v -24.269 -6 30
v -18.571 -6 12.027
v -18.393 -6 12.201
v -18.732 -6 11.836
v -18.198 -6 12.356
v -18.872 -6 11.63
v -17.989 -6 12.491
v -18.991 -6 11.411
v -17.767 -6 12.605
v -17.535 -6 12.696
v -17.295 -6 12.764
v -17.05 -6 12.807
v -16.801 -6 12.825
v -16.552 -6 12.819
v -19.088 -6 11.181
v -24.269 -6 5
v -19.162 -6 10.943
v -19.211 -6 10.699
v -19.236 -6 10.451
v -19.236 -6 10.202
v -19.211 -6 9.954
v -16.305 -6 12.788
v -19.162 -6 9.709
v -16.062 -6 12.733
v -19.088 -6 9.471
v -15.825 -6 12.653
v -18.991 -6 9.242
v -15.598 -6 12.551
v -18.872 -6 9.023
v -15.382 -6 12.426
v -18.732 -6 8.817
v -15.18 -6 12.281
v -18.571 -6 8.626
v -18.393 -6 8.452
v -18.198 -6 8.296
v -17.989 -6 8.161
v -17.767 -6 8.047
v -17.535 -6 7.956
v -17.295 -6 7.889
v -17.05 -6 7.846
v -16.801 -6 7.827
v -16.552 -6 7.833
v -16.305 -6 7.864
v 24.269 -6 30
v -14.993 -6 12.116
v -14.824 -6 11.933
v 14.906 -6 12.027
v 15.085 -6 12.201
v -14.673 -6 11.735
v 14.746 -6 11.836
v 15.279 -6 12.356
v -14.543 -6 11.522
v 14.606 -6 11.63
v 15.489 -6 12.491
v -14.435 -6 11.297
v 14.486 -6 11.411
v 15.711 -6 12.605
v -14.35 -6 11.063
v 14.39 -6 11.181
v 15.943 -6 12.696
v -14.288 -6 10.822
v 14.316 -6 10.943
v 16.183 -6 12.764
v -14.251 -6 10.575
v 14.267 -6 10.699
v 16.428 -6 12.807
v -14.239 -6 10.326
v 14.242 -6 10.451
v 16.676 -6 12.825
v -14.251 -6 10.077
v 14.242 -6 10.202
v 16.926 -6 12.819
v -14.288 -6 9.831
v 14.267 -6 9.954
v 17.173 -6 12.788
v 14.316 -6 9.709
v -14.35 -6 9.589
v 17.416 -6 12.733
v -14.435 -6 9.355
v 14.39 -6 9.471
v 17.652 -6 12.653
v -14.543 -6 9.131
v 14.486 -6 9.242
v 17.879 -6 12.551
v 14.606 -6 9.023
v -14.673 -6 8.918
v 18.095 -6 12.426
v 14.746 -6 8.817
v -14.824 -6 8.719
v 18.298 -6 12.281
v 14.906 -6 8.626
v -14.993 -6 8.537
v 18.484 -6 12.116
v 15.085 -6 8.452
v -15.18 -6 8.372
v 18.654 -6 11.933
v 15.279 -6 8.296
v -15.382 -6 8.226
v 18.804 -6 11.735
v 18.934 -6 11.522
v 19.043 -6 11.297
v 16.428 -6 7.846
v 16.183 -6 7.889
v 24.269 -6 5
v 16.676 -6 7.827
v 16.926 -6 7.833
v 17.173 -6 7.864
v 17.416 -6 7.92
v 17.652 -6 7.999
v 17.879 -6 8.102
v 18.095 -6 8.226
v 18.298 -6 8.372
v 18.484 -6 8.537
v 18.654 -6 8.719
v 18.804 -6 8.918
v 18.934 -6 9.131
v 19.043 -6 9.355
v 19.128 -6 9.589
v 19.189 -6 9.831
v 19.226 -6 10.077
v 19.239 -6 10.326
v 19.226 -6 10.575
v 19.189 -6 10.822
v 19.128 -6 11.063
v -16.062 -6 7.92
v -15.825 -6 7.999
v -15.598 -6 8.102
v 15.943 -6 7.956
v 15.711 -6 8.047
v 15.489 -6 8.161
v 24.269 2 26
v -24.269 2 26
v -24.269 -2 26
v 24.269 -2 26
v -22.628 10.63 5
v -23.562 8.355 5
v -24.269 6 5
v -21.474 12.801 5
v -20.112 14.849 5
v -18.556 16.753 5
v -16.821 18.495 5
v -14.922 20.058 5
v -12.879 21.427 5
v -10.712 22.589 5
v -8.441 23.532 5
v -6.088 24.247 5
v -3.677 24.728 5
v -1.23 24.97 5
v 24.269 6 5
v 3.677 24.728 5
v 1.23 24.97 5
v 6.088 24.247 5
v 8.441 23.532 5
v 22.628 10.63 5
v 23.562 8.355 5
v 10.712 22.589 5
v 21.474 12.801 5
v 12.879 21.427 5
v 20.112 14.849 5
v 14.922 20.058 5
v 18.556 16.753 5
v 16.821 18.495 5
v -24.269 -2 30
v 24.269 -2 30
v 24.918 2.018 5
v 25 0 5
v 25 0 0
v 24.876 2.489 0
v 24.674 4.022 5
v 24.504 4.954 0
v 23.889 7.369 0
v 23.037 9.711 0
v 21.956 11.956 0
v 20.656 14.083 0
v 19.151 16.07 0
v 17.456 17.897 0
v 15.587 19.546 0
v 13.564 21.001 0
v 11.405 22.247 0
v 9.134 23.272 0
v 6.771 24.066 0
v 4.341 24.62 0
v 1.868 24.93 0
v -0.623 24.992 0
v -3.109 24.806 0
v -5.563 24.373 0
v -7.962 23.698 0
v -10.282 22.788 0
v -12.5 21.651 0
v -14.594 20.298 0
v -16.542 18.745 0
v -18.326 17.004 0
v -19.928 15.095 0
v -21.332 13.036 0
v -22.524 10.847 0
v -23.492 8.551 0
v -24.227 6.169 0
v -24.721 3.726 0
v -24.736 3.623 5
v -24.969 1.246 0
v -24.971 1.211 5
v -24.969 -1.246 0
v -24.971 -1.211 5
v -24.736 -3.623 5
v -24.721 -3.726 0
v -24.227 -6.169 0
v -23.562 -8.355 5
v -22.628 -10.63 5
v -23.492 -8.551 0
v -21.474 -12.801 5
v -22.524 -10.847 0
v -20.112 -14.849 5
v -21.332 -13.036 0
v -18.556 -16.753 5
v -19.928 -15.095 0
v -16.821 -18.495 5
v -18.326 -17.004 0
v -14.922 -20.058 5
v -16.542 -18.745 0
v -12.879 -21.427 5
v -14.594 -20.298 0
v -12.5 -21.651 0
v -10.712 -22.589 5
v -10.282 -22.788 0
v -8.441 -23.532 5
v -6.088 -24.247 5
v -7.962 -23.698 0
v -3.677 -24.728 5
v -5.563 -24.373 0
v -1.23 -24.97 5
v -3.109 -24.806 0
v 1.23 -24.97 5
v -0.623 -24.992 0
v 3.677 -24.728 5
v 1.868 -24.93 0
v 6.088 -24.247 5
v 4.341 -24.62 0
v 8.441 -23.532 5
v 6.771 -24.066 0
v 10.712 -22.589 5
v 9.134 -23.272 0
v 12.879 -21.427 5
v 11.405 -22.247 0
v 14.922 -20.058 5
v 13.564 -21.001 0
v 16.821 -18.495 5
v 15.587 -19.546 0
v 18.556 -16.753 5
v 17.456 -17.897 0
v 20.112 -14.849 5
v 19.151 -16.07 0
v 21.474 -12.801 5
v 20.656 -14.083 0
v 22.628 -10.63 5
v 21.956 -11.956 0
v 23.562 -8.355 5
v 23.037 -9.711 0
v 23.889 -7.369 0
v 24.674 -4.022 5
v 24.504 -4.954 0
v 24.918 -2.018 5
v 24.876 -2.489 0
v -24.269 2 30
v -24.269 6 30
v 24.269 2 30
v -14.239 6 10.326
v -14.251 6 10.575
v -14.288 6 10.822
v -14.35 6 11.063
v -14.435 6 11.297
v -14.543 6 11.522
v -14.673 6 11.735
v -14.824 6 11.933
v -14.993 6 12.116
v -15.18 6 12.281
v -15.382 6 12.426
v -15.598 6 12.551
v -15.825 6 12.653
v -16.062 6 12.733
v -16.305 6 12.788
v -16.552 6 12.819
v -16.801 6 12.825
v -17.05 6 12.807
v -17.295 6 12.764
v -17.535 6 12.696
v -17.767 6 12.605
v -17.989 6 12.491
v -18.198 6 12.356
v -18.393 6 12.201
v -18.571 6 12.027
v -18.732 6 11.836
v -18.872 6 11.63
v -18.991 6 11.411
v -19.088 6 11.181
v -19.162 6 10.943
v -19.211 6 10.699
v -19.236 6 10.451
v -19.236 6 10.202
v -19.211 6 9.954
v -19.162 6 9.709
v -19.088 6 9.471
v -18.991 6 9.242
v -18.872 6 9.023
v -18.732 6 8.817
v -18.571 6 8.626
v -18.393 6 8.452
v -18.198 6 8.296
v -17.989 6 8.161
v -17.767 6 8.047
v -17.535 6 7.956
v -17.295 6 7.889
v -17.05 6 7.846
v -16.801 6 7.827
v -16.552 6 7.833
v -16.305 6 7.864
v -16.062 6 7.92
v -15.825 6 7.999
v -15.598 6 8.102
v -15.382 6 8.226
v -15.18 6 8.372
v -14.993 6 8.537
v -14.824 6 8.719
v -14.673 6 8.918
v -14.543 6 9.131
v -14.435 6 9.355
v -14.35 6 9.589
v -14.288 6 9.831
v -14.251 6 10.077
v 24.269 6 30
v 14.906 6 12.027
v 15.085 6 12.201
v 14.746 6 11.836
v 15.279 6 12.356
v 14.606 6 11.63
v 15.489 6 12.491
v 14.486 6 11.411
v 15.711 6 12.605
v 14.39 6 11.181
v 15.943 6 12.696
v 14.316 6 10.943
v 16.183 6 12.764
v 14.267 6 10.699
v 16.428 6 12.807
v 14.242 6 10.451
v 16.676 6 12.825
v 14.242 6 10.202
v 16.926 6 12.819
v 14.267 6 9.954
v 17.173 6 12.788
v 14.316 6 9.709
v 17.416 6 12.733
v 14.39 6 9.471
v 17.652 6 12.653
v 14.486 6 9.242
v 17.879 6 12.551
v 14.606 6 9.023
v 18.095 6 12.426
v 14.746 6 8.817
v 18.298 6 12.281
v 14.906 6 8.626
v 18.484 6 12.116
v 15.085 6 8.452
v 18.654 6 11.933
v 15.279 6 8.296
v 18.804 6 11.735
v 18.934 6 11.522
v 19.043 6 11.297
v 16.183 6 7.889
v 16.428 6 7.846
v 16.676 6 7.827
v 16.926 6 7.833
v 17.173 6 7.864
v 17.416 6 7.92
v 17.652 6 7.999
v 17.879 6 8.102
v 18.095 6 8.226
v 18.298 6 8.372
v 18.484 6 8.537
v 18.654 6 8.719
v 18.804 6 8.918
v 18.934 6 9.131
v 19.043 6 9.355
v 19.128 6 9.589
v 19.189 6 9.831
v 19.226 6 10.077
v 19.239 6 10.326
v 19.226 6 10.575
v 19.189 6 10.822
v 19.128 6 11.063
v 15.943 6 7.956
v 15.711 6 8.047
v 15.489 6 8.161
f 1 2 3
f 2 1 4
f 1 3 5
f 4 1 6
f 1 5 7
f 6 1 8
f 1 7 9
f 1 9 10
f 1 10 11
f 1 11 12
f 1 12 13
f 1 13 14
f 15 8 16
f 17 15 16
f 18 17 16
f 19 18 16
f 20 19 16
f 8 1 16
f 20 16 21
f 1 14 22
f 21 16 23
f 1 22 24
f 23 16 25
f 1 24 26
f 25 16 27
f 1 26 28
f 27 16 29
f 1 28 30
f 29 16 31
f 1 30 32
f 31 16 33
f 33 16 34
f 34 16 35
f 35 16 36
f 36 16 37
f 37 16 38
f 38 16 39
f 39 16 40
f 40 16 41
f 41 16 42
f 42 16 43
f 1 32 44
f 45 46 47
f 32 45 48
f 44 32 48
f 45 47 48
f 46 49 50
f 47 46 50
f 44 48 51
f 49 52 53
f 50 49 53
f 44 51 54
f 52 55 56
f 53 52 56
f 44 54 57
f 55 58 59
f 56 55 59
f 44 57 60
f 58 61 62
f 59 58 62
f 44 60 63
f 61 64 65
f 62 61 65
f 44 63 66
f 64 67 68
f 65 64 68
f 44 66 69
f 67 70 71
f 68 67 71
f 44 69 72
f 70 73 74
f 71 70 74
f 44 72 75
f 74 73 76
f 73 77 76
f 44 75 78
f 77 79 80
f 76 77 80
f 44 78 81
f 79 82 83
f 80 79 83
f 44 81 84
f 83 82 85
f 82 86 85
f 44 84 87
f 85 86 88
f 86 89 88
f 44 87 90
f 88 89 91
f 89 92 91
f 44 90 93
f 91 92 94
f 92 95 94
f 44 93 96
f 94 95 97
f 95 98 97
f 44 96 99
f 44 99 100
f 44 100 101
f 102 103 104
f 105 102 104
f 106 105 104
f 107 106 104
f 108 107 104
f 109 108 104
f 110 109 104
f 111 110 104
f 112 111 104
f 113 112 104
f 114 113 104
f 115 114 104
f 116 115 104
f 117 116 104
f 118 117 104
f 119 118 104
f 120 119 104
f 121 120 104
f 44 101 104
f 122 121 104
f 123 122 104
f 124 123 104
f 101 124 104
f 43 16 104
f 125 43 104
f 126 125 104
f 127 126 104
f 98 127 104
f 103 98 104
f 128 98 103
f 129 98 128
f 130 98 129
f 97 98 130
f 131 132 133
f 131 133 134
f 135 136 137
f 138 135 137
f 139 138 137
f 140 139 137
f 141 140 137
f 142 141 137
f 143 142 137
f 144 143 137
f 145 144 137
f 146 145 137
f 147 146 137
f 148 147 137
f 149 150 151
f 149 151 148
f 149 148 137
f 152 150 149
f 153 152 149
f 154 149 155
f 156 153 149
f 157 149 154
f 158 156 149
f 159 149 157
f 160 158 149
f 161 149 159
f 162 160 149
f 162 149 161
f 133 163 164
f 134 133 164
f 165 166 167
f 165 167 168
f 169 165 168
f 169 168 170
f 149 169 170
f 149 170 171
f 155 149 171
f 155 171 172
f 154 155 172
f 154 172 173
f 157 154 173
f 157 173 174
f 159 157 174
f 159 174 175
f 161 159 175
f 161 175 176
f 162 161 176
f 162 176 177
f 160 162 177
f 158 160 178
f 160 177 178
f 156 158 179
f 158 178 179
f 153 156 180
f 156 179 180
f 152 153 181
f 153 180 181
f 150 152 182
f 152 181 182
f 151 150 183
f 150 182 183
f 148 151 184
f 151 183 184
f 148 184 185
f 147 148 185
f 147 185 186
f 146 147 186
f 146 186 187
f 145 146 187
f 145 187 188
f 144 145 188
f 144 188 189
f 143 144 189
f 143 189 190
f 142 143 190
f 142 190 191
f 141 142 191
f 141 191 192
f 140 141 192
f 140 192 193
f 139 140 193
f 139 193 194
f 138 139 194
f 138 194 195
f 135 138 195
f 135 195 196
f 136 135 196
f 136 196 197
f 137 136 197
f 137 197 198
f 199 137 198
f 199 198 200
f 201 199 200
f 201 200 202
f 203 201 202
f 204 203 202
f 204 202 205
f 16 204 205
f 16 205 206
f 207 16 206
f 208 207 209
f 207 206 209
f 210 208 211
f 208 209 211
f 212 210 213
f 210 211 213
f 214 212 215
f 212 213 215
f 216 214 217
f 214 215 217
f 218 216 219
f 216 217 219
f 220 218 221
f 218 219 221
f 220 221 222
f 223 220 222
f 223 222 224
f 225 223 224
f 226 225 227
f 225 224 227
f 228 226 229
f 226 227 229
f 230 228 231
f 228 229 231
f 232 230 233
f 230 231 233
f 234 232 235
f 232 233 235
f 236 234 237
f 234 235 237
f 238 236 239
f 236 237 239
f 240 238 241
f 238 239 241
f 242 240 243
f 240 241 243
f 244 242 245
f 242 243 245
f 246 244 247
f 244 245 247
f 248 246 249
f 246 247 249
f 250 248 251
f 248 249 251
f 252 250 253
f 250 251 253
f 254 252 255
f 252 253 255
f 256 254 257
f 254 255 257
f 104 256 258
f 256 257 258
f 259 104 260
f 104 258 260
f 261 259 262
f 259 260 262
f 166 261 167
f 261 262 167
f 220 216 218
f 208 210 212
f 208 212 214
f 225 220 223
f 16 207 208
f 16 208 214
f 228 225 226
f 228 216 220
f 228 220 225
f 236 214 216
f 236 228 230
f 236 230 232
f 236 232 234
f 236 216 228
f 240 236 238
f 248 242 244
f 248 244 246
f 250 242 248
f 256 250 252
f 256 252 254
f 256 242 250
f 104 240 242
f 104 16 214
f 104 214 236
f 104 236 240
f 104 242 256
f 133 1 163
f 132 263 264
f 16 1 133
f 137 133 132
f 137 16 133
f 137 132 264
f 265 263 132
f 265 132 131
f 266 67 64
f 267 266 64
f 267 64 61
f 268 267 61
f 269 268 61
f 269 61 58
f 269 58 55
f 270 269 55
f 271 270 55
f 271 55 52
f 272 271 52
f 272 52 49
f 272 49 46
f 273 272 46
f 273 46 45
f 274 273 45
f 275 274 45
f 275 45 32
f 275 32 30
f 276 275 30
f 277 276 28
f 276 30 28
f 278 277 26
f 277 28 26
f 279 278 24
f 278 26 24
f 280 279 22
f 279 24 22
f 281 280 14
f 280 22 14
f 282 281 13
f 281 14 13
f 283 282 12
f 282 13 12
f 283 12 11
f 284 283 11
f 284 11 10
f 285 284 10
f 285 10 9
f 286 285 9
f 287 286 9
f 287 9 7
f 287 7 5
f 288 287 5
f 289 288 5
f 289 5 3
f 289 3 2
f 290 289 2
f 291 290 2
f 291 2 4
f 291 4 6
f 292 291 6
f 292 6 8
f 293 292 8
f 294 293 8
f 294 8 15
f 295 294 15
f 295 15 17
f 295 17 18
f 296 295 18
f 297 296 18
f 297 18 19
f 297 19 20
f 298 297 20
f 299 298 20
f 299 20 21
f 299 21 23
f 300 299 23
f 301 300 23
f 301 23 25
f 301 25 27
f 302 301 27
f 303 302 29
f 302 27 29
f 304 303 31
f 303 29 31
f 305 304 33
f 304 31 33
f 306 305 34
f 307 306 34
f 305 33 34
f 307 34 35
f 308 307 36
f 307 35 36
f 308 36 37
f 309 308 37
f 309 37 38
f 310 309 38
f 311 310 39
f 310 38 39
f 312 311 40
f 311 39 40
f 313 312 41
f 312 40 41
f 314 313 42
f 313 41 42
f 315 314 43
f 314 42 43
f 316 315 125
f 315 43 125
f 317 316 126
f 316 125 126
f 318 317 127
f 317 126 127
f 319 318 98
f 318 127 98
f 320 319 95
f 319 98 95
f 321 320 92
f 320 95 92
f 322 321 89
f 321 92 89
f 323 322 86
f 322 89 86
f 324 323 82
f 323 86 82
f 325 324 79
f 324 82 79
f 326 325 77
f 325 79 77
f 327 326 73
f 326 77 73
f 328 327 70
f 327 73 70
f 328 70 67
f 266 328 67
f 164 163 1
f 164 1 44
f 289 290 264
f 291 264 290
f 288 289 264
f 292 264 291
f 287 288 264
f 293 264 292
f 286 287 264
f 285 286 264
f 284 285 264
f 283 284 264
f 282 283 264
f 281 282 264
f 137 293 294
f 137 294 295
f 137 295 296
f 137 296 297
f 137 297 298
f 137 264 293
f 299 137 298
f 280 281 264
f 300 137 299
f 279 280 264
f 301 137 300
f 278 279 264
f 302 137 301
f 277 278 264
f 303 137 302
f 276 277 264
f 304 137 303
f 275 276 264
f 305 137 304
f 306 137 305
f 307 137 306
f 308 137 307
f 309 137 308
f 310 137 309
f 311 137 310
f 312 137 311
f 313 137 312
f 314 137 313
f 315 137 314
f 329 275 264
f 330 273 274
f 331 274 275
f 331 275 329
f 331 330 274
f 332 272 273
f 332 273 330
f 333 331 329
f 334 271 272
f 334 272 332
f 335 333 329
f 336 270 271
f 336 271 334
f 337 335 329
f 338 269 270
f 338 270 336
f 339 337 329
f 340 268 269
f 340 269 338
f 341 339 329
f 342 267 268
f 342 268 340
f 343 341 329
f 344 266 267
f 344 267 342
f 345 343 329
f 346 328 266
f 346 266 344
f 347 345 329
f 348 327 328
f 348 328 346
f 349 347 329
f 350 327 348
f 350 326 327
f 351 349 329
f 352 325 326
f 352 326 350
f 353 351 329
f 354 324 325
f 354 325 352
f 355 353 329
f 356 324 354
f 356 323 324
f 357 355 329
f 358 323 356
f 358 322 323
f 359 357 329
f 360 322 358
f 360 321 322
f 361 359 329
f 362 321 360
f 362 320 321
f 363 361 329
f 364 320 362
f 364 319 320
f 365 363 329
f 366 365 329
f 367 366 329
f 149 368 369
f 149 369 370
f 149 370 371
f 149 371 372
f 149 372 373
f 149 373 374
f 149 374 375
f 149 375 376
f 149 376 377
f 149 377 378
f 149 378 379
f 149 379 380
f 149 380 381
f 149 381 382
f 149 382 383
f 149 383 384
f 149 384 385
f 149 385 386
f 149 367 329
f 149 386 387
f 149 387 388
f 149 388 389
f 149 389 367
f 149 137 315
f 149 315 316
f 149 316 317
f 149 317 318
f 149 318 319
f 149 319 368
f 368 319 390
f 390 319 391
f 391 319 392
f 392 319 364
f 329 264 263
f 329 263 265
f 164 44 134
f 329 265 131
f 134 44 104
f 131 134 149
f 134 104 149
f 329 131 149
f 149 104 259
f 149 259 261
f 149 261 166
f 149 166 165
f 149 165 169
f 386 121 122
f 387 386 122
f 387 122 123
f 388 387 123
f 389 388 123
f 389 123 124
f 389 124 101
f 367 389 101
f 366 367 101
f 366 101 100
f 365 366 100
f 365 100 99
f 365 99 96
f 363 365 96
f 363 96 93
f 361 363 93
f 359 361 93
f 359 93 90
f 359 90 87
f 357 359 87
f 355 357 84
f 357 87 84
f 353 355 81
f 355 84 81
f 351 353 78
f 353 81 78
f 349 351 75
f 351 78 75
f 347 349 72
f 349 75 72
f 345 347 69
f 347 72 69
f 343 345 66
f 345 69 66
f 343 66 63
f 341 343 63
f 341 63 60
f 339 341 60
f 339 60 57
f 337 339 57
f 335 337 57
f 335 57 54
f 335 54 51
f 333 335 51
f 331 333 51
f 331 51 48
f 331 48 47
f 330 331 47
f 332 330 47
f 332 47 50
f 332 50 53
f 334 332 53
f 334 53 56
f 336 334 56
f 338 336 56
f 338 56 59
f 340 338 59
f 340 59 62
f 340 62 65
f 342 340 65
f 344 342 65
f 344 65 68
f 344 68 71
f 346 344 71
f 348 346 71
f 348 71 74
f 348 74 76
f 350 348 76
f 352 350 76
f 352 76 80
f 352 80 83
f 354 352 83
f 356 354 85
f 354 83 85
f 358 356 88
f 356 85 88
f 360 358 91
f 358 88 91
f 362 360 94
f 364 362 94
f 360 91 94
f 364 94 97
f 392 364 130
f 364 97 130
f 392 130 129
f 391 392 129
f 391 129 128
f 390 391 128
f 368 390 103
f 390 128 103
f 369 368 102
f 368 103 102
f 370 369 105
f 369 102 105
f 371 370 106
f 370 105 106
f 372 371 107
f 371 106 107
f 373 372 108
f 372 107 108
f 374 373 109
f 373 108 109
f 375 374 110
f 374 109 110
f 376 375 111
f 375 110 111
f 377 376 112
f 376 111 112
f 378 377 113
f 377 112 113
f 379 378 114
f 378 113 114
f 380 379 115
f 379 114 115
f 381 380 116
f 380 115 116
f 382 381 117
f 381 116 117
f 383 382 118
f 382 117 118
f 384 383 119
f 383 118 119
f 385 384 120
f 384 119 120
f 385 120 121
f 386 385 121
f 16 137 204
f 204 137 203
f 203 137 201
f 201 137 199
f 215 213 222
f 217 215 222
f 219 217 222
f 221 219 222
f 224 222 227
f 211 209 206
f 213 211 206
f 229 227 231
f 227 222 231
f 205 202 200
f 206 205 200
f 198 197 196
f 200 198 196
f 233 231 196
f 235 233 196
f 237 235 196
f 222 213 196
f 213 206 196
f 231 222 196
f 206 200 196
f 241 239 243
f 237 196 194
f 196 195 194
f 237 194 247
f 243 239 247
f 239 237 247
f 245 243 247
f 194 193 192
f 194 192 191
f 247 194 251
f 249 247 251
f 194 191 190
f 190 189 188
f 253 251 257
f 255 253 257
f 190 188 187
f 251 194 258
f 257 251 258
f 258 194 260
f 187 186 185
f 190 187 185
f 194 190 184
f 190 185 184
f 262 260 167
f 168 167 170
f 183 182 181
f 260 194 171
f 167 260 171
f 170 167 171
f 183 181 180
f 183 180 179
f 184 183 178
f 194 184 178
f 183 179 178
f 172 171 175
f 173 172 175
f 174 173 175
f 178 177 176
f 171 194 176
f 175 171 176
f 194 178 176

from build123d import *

# Parameters (mm, degrees)
F0_R     = 25
F1_DEPTH = 5
F2_W     = 48.538644
F2_H     = 12
F3_DEPTH = 25
F4_W     = 48.538644
F4_H     = 4
F5_DEPTH = 4
F6_R     = 2.5
F7_DEPTH = 31.001


with BuildPart() as f1:
    # F0 (on Top) → F1 (new body)
    with BuildSketch(Plane.XY):
        Circle(F0_R)
    extrude(amount=F1_DEPTH)

    # F2 (on face) → F3 (join)
    with BuildSketch(Plane.XY.offset(5)):
        Rectangle(F2_W, F2_H)
    extrude(amount=F3_DEPTH)

    # F4 (on face) → F5 (cut)
    with BuildSketch(Plane.XY.offset(30)):
        Rectangle(F4_W, F4_H)
    extrude(amount=-F5_DEPTH, mode=Mode.SUBTRACT)

    # F6 (on face) → F7 (cut, through all)
    with BuildSketch(Plane.XZ.offset(6)):
        with Locations((-16.73882, 10.326263)):
            Circle(F6_R)
        with Locations((16.73882, 10.326263)):
            Circle(F6_R)
    extrude(amount=-F7_DEPTH, mode=Mode.SUBTRACT)


solid = f1.part
